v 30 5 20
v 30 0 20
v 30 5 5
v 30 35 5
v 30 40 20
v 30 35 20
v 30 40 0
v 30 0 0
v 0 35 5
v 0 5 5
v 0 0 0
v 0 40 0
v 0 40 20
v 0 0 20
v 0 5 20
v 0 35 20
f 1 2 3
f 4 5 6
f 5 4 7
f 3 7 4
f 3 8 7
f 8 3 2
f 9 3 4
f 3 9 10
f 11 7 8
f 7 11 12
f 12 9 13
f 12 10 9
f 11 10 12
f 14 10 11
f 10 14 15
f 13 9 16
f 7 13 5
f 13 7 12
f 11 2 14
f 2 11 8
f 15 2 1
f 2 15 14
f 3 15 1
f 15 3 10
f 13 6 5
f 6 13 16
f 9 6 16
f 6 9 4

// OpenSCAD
cube([30,40,5]);
cube([30,5,20]);
translate([0,35,0]) cube([30,5,20]);
